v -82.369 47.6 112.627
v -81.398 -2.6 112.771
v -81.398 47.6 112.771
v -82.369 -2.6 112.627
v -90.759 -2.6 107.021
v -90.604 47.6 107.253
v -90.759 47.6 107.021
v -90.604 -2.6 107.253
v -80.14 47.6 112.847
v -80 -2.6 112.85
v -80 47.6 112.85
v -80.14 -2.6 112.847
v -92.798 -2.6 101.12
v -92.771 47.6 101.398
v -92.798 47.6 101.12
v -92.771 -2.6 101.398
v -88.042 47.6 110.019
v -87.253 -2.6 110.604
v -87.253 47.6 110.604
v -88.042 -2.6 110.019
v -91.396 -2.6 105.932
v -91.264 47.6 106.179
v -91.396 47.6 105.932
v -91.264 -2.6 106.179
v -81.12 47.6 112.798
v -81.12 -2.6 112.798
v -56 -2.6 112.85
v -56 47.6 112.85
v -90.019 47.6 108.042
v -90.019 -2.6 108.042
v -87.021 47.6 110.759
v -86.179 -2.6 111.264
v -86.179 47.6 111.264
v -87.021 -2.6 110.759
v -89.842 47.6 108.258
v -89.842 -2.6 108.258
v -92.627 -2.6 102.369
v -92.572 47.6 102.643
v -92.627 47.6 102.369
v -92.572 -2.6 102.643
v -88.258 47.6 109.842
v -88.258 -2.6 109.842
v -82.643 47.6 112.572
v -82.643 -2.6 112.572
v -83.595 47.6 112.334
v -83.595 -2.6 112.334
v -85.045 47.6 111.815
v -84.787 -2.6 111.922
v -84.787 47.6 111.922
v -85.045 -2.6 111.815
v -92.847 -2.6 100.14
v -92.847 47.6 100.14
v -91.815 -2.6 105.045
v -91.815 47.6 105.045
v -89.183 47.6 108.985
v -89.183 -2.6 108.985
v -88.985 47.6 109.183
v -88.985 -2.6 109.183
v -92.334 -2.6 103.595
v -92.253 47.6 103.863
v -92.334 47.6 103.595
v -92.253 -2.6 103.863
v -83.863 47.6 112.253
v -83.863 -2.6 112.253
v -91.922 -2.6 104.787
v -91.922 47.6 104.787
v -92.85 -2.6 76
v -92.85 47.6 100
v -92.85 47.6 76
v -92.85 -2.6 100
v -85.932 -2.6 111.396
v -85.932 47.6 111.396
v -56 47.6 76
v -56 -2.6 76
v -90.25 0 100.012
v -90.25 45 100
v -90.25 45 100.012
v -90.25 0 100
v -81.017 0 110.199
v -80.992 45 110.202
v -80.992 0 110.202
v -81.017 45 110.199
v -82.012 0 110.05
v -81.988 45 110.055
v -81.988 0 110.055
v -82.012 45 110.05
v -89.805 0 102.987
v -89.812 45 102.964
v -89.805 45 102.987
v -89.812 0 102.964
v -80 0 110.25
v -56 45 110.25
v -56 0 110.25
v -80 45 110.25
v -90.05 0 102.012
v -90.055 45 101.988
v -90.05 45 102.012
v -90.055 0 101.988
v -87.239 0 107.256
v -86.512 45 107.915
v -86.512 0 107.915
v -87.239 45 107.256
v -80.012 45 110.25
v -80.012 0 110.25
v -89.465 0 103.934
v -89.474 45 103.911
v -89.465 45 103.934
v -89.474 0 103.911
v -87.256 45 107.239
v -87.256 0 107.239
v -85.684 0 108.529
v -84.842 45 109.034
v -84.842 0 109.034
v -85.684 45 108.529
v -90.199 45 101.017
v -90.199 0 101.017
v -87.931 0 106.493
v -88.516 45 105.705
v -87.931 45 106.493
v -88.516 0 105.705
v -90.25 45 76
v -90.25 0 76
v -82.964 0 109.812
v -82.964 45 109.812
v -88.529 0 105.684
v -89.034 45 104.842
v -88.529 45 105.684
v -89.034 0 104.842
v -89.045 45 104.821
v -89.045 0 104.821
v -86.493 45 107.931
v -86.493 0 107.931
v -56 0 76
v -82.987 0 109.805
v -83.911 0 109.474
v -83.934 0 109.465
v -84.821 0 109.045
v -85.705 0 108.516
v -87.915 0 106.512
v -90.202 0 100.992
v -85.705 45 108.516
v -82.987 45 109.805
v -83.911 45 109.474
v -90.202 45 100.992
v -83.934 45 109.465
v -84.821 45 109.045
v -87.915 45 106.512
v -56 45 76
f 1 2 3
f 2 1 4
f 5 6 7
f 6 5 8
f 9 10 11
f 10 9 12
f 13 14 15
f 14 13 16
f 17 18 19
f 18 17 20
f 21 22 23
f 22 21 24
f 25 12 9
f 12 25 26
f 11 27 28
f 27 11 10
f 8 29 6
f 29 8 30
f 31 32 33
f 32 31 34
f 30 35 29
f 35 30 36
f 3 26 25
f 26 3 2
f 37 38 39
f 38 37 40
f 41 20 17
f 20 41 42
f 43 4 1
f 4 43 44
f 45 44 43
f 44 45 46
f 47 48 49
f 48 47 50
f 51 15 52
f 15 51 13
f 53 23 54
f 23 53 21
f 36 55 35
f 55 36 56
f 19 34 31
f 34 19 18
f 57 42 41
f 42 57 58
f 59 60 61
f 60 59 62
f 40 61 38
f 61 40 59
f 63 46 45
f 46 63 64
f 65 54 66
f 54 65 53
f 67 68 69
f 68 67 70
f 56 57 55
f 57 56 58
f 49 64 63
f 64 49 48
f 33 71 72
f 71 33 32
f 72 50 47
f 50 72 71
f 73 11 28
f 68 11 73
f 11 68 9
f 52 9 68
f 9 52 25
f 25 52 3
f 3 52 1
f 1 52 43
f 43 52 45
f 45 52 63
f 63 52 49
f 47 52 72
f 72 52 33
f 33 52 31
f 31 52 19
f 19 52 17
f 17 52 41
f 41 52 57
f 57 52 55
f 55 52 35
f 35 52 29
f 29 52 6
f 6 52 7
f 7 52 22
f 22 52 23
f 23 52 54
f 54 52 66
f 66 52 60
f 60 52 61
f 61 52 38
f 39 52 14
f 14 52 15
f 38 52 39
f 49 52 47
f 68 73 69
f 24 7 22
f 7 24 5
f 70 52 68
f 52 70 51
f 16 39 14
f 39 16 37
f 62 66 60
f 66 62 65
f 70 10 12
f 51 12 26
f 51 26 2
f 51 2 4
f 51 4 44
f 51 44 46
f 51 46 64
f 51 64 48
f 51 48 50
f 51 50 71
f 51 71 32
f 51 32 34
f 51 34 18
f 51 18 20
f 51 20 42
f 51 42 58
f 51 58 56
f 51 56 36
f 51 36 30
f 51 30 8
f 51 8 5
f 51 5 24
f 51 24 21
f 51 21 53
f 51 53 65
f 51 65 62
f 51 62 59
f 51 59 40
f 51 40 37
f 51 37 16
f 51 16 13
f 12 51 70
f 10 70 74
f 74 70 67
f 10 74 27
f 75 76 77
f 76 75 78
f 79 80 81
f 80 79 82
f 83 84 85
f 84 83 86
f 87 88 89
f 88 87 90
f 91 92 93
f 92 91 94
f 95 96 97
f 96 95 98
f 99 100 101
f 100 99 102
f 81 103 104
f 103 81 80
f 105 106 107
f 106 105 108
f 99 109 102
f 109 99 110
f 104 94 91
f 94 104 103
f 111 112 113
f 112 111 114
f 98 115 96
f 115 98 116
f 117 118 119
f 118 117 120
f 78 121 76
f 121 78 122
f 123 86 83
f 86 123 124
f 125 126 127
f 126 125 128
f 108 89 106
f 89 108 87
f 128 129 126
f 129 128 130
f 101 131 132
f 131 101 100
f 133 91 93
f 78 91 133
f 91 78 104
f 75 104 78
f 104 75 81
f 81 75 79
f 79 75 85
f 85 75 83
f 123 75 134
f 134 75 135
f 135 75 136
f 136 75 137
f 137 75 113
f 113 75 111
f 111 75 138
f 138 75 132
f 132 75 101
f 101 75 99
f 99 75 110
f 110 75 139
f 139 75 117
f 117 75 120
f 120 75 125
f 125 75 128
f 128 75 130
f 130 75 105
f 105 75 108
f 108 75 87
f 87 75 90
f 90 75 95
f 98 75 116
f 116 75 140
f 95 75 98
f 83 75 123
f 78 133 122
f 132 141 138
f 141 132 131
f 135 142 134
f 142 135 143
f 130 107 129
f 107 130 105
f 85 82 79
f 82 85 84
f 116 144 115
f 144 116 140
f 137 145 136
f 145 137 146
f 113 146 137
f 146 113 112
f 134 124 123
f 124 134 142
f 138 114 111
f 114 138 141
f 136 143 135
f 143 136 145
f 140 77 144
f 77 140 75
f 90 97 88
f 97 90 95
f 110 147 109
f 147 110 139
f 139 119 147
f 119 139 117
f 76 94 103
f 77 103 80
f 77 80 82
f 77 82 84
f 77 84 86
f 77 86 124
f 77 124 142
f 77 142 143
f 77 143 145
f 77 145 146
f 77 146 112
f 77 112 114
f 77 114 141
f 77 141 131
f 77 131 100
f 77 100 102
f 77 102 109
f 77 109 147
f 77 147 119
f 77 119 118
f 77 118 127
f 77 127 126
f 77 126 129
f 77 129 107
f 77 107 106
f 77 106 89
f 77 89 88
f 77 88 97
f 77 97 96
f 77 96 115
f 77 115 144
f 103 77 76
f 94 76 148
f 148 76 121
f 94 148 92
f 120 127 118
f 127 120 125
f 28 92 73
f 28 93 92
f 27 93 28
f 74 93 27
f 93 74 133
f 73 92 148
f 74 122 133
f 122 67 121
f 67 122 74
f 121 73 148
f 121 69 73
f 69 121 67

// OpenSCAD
// file: ../../sorgenti/libreria.scad
// ============================================================
// libreria.scad — forme di base riusate da tutti i pezzi
// ============================================================
include <parametri.scad>

$fn = RISOLUZIONE;

// Prisma a sezione rettangolare con angoli arrotondati.
module piastra(x, y, h, r) {
    linear_extrude(height = h)
        offset(r = r) square([x - 2*r, y - 2*r], center = true);
}

// Scatola piena con angoli verticali arrotondati (rv) e bordo
// superiore raccordato (rt). Il raccordo è approssimato a gradini
// uniti con hull(): resta liscio e si stampa senza supporti.
module scatola_arrotondata(x, y, z, rv, rt, passi = 12) {
    union() {
        piastra(x, y, z - rt, rv);
        for (i = [0 : passi - 1]) {
            a0 = 90 * i / passi;
            a1 = 90 * (i + 1) / passi;
            k0 = rt * (1 - cos(a0));  k1 = rt * (1 - cos(a1));
            h0 = rt * sin(a0);        h1 = rt * sin(a1);
            hull() {
                translate([0, 0, z - rt + h0])
                    piastra(x - 2*k0, y - 2*k0, 0.02, max(rv - k0, 0.6));
                translate([0, 0, z - rt + h1])
                    piastra(x - 2*k1, y - 2*k1, 0.02, max(rv - k1, 0.6));
            }
        }
    }
}

// Foro di passaggio per vite con svasatura della testa (testa in basso,
// si avvita dal basso verso l'alto).
module foro_svasato(h = 10, d = VITE_FORO, testa_d = VITE_TESTA_D, testa_h = 1.6) {
    translate([0, 0, -0.1]) cylinder(h = h + 0.2, d = d);
    translate([0, 0, -0.1]) cylinder(h = testa_h + 0.1, d1 = testa_d, d2 = d);
}

// Pilastrino con sede per inserto a caldo M2,5 (si inserisce dal basso).
module boss_inserto(h = 12, d = BOSS_D) {
    difference() {
        cylinder(h = h, d = d);
        translate([0, 0, -0.1]) cylinder(h = INSERTO_H + 0.1, d = INSERTO_D);
        // scarico sopra l'inserto, per la punta della vite
        translate([0, 0, INSERTO_H]) cylinder(h = h, d = VITE_D + 0.4);
    }
}

// Griglia di fori a nido d'ape dentro un cerchio di diametro d_area.
module griglia_tonda(d_area, spessore, d_foro = ALT_GRIGLIA_D, passo = 3.2) {
    n = ceil(d_area / passo) + 2;
    for (i = [-n : n], j = [-n : n]) {
        x = i * passo + (abs(j) % 2) * passo / 2;
        y = j * passo * 0.866;
        if (sqrt(x*x + y*y) <= (d_area - d_foro) / 2)
            translate([x, y, -0.1]) cylinder(h = spessore + 0.2, d = d_foro);
    }
}

// Fessura allungata (slot) con estremi arrotondati, asse X.
module fessura(lung, larg, h) {
    hull() {
        translate([-(lung - larg)/2, 0, 0]) cylinder(h = h, d = larg);
        translate([ (lung - larg)/2, 0, 0]) cylinder(h = h, d = larg);
    }
}

// Scritta in rilievo (per i provini e le etichette).
module scritta(t, dim = 6, alt = 0.6) {
    linear_extrude(height = alt)
        text(t, size = dim, halign = "center", valign = "center",
             font = "Helvetica:style=Bold");
}

// Freccia piena, punta verso +X, usata per le icone dei tasti.
module freccia(lung = 16, larg = 14, alt = 0.8) {
    gambo = larg / 5;          // mezza larghezza del gambo
    testa = lung * 0.45;       // lunghezza della punta
    linear_extrude(height = alt)
        polygon([[-lung/2, -gambo], [lung/2 - testa, -gambo],
                 [lung/2 - testa, -larg/2], [lung/2, 0],
                 [lung/2 - testa, larg/2], [lung/2 - testa, gambo],
                 [-lung/2, gambo]]);
}

// Icona "volume": tre barrette crescenti, asse X.
module icona_volume(n = 3, alt = 0.8, passo = 3.2, base = 2.0, cresc = 1.6) {
    for (i = [0 : n - 1])
        translate([i * passo, 0, 0])
            linear_extrude(height = alt)
                square([1.8, base + i * cresc], center = true);
}

// Cava a sezione rettangolare arrotondata, asse di estrusione Y.
// Utile per finestre e fessure nelle pareti verticali.
module cava_y(x, z, prof, r = 1.5) {
    rotate([90, 0, 0])
        linear_extrude(height = prof, center = true)
            offset(r = r) square([x - 2*r, z - 2*r], center = true);
}

// Pilastrino che parte dal piano del fondo e ospita un inserto a caldo
// (inserito dal basso). La punta conica in alto lo rende stampabile
// anche a scatola capovolta.
module boss_fondo(h = 12) {
    union() {
        difference() {
            cylinder(h = h, d = BOSS_D);
            translate([0, 0, -0.1]) cylinder(h = INSERTO_H + 0.1, d = INSERTO_D);
            translate([0, 0, INSERTO_H]) cylinder(h = h, d = VITE_D + 0.6);
        }
        translate([0, 0, h]) cylinder(h = BOSS_D/2, d1 = BOSS_D, d2 = 0.4);
    }
}

// Pilastrino appeso al soffitto (coperchio): l'inserto entra dal basso.
module boss_soffitto(h = 7) {
    difference() {
        translate([0, 0, -h]) cylinder(h = h, d = BOSS_D);
        translate([0, 0, -h - 0.1]) cylinder(h = INSERTO_H + 0.1, d = INSERTO_D);
    }
}

// Maschio della coda di rondine: si infila nella cava della fiancata.
// Si stampa in verticale insieme al raccoglitore, quindi senza supporti.
module coda_maschio(altezza) {
    gioco = 0.35;
    rotate([-90, 0, 0])
        linear_extrude(height = altezza)
            polygon([[0, -(CODA_FONDO - gioco)/2], [0, (CODA_FONDO - gioco)/2],
                     [CODA_PROF - 0.3, (CODA_BOCCA - gioco)/2],
                     [CODA_PROF - 0.3, -(CODA_BOCCA - gioco)/2]]);
}
// file: parametri-v2.scad
// ============================================================
// parametri-v2.scad — console da viaggio (variante v2)
// ------------------------------------------------------------
// Alternativa al cubo: si tiene con due mani, carte e dischi si
// infilano in una fessura sul bordo superiore, la collezione sta
// in un vano sul retro.
//
// Le misure del cubo (parametri.scad) restano valide per tutto
// quello che non cambia: componenti, tolleranze, viti, cursore,
// tasti, altoparlante, LED. Qui c'è solo ciò che è diverso.
// ============================================================
include <../../sorgenti/parametri.scad>

// ---------- corpo ----------
V2_X         = 180;   // larghezza: due mani
V2_Z         = 110;   // altezza
V2_Y         = 45;    // spessore
V2_RAGGIO    = 10;    // raggio degli angoli, generoso: si prende e cade
V2_PARETE    = 2.4;
V2_SPLIT     = 26;    // a che profondità si dividono i due gusci (dal fronte)

// ---------- fessura ----------
// La carta entra di lato corto e ne sporge un centimetro: così la
// spira del tag, che corre lungo il bordo della CR80, finisce tutta
// davanti all'antenna. Prima l'idea era infilarla di lato lungo per
// metà, e la lettura restava un'incognita.
V2_FESS_LARG  = CARTA_X + 2.4;      // 88,0: ci passa anche il disco Ø60
V2_FESS_SPESS = 5.4;                // carta 0,84, disco 4: passa tutto
V2_SPORGE     = 10;                 // quanto resta fuori per afferrare
V2_FESS_PROF  = CARTA_Y - V2_SPORGE + 6;  // 50: tasca sotto la fessura
V2_IMBUTO     = 2.5;                // svasatura d'ingresso, per infilare al buio

// ---------- antenna e schermo ----------
V2_PN_Y       = 9;    // dove sta il PN5180, dal fronte

// ---------- comandi sul fronte ----------
V2_TASTO_X    = 67;   // sotto i pollici
V2_TASTO_Z    = 70;   // alti: sotto restano liberi i 52 mm della camera
// Altoparlante in basso e un po' a destra: sopra c'e' la tasca della
// fessura (la sua cava taglierebbe la camera acustica) e a sinistra passa
// il cursore. Fuori centro si nota appena, e il suono non cambia.
V2_ALT_X      = 32;
V2_ALT_Z      = 26;
V2_LED_Z      = 100;  // sopra il tasto sinistro
// Il cursore del volume passa sul bordo INFERIORE, non sulla faccia: sulla
// faccia, fra camera acustica e tasca, restavano 32 mm e ne servono 52.
// Sul bordo sta comodo al pollice e non si preme appoggiando la console.
V2_CURSORE_X  = -41;  // sul bordo in basso a sinistra, lontano dalla camera
V2_CURSORE_VITI = CURSORE_LUNG/2 + 4.5;   // dove si avvita la culla
V2_CURSORE_COLLARE = CURSORE_CORSA + 14;  // piu' stretto che sul cubo: il
                                          // bordo e' lungo 180 e il collare
                                          // largo non ci starebbe
V2_CURSORE_Y  = 9;    // quanto e' arretrato dal fronte
V2_CURSORE_Z  = 0;    // sul bordo inferiore

// ---------- vano della collezione, sul retro ----------
V2_VANO_X     = 96;   // ci stanno 6 carte in piedi, o 3 dischi
V2_VANO_Z     = 64;
V2_VANO_PROF  = 13;
V2_VANO_X0    = 30;   // spostato a destra: a sinistra c'è la batteria
V2_VANO_Z0    = 30;

// ---------- USB-C sul bordo inferiore ----------
// Sotto il vano, non sotto la batteria: li' c'e' posto per il TP4056.
V2_USB_X      = 20;

// ---------- disposizione interna ----------
// La batteria sta in orizzontale in basso a sinistra, a cavallo dei due
// gusci: da sola la meta' posteriore e' profonda 16,6 mm e il
// portabatteria ne vuole 20. Le culle la tengono da entrambe le parti,
// che per una versione da viaggio e' anche meglio.
// In orizzontale il portabatteria (78 mm) non ci starebbe: fra la parete
// sinistra e il vano della collezione ce ne sono 70. Quindi va in piedi.
V2_BATT_X     = -70;
V2_BATT_Z     = 55;
V2_BATT_Y     = 32;    // a cavallo dello stacco (26): la culla e' divisa

V2_BASETTA_X  = 36;    // stretta: ci sta la DevKitC-1 (63 x 25) per il verso
V2_BASETTA_Z  = 80;    // lungo, con una decina di millimetri per i fili
V2_BASETTA_CX = -38;   // fra la batteria e il vano
V2_BASETTA_CZ = 55;
V2_BASETTA_Y  = 6;     // quanto sta sollevata dal fondo del guscio posteriore

V2_TP_X       = 20;    // modulo di ricarica, allineato alla presa
V2_TP_Z       = 13;

// ---------- ferrite ----------
V2_FERRITE_X  = 60;    // ritagliata piu' grande della spira dell'antenna
V2_FERRITE_Z  = 50;
V2_FERRITE_SP = 0.5;
// main file
// ============================================================
// paracolpi-v2.scad — i quattro angoli morbidi della console
// ------------------------------------------------------------
// Si infilano sugli spigoli e si tengono da soli per attrito.
// Vanno stampati in TPU (shore 95A): è l'unico pezzo del
// progetto che non è in PETG, ed è anche il motivo per cui sono
// separati — così il resto si stampa senza cambiare materiale.
//
// Se non hai TPU, la console funziona lo stesso: questi servono
// solo a far sopravvivere meglio le cadute.
//
// STAMPA: in piedi, 3 perimetri, niente riempimento, niente
// supporti. In TPU rallenta: 20 mm/s.
// ============================================================
include <parametri-v2.scad>
include <../../sorgenti/libreria.scad>

PARA_LATO   = 34;    // quanto risale lungo i bordi
PARA_SP     = 2.6;   // spessore del cappuccio
PARA_GIOCO  = 0.25;  // il TPU è elastico: serve meno gioco del PETG

paracolpo();

module paracolpo() {
    intersection() {
        difference() {
            guscio_angolo(PARA_SP);
            guscio_angolo(0);
        }
        // tiene solo l'angolo in alto a sinistra: gli altri tre si
        // ottengono specchiando in stampa (o stampando quattro volte
        // questo e girandolo).
        translate([-V2_X/2 - PARA_SP - 1, -PARA_SP - 1, V2_Z - PARA_LATO])
            cube([PARA_LATO + PARA_SP + 1, V2_Y + 2*PARA_SP + 2,
                  PARA_LATO + PARA_SP + 1]);
    }
}

// Il cappuccio segue il profilo della console, ingrossato di sp.
module guscio_angolo(sp) {
    translate([0, V2_Y + sp, V2_Z/2])
        rotate([90, 0, 0])
            linear_extrude(height = V2_Y + 2 * sp)
                offset(r = sp + PARA_GIOCO)
                    offset(r = V2_RAGGIO)
                        square([V2_X - 2*V2_RAGGIO, V2_Z - 2*V2_RAGGIO], center = true);
}
